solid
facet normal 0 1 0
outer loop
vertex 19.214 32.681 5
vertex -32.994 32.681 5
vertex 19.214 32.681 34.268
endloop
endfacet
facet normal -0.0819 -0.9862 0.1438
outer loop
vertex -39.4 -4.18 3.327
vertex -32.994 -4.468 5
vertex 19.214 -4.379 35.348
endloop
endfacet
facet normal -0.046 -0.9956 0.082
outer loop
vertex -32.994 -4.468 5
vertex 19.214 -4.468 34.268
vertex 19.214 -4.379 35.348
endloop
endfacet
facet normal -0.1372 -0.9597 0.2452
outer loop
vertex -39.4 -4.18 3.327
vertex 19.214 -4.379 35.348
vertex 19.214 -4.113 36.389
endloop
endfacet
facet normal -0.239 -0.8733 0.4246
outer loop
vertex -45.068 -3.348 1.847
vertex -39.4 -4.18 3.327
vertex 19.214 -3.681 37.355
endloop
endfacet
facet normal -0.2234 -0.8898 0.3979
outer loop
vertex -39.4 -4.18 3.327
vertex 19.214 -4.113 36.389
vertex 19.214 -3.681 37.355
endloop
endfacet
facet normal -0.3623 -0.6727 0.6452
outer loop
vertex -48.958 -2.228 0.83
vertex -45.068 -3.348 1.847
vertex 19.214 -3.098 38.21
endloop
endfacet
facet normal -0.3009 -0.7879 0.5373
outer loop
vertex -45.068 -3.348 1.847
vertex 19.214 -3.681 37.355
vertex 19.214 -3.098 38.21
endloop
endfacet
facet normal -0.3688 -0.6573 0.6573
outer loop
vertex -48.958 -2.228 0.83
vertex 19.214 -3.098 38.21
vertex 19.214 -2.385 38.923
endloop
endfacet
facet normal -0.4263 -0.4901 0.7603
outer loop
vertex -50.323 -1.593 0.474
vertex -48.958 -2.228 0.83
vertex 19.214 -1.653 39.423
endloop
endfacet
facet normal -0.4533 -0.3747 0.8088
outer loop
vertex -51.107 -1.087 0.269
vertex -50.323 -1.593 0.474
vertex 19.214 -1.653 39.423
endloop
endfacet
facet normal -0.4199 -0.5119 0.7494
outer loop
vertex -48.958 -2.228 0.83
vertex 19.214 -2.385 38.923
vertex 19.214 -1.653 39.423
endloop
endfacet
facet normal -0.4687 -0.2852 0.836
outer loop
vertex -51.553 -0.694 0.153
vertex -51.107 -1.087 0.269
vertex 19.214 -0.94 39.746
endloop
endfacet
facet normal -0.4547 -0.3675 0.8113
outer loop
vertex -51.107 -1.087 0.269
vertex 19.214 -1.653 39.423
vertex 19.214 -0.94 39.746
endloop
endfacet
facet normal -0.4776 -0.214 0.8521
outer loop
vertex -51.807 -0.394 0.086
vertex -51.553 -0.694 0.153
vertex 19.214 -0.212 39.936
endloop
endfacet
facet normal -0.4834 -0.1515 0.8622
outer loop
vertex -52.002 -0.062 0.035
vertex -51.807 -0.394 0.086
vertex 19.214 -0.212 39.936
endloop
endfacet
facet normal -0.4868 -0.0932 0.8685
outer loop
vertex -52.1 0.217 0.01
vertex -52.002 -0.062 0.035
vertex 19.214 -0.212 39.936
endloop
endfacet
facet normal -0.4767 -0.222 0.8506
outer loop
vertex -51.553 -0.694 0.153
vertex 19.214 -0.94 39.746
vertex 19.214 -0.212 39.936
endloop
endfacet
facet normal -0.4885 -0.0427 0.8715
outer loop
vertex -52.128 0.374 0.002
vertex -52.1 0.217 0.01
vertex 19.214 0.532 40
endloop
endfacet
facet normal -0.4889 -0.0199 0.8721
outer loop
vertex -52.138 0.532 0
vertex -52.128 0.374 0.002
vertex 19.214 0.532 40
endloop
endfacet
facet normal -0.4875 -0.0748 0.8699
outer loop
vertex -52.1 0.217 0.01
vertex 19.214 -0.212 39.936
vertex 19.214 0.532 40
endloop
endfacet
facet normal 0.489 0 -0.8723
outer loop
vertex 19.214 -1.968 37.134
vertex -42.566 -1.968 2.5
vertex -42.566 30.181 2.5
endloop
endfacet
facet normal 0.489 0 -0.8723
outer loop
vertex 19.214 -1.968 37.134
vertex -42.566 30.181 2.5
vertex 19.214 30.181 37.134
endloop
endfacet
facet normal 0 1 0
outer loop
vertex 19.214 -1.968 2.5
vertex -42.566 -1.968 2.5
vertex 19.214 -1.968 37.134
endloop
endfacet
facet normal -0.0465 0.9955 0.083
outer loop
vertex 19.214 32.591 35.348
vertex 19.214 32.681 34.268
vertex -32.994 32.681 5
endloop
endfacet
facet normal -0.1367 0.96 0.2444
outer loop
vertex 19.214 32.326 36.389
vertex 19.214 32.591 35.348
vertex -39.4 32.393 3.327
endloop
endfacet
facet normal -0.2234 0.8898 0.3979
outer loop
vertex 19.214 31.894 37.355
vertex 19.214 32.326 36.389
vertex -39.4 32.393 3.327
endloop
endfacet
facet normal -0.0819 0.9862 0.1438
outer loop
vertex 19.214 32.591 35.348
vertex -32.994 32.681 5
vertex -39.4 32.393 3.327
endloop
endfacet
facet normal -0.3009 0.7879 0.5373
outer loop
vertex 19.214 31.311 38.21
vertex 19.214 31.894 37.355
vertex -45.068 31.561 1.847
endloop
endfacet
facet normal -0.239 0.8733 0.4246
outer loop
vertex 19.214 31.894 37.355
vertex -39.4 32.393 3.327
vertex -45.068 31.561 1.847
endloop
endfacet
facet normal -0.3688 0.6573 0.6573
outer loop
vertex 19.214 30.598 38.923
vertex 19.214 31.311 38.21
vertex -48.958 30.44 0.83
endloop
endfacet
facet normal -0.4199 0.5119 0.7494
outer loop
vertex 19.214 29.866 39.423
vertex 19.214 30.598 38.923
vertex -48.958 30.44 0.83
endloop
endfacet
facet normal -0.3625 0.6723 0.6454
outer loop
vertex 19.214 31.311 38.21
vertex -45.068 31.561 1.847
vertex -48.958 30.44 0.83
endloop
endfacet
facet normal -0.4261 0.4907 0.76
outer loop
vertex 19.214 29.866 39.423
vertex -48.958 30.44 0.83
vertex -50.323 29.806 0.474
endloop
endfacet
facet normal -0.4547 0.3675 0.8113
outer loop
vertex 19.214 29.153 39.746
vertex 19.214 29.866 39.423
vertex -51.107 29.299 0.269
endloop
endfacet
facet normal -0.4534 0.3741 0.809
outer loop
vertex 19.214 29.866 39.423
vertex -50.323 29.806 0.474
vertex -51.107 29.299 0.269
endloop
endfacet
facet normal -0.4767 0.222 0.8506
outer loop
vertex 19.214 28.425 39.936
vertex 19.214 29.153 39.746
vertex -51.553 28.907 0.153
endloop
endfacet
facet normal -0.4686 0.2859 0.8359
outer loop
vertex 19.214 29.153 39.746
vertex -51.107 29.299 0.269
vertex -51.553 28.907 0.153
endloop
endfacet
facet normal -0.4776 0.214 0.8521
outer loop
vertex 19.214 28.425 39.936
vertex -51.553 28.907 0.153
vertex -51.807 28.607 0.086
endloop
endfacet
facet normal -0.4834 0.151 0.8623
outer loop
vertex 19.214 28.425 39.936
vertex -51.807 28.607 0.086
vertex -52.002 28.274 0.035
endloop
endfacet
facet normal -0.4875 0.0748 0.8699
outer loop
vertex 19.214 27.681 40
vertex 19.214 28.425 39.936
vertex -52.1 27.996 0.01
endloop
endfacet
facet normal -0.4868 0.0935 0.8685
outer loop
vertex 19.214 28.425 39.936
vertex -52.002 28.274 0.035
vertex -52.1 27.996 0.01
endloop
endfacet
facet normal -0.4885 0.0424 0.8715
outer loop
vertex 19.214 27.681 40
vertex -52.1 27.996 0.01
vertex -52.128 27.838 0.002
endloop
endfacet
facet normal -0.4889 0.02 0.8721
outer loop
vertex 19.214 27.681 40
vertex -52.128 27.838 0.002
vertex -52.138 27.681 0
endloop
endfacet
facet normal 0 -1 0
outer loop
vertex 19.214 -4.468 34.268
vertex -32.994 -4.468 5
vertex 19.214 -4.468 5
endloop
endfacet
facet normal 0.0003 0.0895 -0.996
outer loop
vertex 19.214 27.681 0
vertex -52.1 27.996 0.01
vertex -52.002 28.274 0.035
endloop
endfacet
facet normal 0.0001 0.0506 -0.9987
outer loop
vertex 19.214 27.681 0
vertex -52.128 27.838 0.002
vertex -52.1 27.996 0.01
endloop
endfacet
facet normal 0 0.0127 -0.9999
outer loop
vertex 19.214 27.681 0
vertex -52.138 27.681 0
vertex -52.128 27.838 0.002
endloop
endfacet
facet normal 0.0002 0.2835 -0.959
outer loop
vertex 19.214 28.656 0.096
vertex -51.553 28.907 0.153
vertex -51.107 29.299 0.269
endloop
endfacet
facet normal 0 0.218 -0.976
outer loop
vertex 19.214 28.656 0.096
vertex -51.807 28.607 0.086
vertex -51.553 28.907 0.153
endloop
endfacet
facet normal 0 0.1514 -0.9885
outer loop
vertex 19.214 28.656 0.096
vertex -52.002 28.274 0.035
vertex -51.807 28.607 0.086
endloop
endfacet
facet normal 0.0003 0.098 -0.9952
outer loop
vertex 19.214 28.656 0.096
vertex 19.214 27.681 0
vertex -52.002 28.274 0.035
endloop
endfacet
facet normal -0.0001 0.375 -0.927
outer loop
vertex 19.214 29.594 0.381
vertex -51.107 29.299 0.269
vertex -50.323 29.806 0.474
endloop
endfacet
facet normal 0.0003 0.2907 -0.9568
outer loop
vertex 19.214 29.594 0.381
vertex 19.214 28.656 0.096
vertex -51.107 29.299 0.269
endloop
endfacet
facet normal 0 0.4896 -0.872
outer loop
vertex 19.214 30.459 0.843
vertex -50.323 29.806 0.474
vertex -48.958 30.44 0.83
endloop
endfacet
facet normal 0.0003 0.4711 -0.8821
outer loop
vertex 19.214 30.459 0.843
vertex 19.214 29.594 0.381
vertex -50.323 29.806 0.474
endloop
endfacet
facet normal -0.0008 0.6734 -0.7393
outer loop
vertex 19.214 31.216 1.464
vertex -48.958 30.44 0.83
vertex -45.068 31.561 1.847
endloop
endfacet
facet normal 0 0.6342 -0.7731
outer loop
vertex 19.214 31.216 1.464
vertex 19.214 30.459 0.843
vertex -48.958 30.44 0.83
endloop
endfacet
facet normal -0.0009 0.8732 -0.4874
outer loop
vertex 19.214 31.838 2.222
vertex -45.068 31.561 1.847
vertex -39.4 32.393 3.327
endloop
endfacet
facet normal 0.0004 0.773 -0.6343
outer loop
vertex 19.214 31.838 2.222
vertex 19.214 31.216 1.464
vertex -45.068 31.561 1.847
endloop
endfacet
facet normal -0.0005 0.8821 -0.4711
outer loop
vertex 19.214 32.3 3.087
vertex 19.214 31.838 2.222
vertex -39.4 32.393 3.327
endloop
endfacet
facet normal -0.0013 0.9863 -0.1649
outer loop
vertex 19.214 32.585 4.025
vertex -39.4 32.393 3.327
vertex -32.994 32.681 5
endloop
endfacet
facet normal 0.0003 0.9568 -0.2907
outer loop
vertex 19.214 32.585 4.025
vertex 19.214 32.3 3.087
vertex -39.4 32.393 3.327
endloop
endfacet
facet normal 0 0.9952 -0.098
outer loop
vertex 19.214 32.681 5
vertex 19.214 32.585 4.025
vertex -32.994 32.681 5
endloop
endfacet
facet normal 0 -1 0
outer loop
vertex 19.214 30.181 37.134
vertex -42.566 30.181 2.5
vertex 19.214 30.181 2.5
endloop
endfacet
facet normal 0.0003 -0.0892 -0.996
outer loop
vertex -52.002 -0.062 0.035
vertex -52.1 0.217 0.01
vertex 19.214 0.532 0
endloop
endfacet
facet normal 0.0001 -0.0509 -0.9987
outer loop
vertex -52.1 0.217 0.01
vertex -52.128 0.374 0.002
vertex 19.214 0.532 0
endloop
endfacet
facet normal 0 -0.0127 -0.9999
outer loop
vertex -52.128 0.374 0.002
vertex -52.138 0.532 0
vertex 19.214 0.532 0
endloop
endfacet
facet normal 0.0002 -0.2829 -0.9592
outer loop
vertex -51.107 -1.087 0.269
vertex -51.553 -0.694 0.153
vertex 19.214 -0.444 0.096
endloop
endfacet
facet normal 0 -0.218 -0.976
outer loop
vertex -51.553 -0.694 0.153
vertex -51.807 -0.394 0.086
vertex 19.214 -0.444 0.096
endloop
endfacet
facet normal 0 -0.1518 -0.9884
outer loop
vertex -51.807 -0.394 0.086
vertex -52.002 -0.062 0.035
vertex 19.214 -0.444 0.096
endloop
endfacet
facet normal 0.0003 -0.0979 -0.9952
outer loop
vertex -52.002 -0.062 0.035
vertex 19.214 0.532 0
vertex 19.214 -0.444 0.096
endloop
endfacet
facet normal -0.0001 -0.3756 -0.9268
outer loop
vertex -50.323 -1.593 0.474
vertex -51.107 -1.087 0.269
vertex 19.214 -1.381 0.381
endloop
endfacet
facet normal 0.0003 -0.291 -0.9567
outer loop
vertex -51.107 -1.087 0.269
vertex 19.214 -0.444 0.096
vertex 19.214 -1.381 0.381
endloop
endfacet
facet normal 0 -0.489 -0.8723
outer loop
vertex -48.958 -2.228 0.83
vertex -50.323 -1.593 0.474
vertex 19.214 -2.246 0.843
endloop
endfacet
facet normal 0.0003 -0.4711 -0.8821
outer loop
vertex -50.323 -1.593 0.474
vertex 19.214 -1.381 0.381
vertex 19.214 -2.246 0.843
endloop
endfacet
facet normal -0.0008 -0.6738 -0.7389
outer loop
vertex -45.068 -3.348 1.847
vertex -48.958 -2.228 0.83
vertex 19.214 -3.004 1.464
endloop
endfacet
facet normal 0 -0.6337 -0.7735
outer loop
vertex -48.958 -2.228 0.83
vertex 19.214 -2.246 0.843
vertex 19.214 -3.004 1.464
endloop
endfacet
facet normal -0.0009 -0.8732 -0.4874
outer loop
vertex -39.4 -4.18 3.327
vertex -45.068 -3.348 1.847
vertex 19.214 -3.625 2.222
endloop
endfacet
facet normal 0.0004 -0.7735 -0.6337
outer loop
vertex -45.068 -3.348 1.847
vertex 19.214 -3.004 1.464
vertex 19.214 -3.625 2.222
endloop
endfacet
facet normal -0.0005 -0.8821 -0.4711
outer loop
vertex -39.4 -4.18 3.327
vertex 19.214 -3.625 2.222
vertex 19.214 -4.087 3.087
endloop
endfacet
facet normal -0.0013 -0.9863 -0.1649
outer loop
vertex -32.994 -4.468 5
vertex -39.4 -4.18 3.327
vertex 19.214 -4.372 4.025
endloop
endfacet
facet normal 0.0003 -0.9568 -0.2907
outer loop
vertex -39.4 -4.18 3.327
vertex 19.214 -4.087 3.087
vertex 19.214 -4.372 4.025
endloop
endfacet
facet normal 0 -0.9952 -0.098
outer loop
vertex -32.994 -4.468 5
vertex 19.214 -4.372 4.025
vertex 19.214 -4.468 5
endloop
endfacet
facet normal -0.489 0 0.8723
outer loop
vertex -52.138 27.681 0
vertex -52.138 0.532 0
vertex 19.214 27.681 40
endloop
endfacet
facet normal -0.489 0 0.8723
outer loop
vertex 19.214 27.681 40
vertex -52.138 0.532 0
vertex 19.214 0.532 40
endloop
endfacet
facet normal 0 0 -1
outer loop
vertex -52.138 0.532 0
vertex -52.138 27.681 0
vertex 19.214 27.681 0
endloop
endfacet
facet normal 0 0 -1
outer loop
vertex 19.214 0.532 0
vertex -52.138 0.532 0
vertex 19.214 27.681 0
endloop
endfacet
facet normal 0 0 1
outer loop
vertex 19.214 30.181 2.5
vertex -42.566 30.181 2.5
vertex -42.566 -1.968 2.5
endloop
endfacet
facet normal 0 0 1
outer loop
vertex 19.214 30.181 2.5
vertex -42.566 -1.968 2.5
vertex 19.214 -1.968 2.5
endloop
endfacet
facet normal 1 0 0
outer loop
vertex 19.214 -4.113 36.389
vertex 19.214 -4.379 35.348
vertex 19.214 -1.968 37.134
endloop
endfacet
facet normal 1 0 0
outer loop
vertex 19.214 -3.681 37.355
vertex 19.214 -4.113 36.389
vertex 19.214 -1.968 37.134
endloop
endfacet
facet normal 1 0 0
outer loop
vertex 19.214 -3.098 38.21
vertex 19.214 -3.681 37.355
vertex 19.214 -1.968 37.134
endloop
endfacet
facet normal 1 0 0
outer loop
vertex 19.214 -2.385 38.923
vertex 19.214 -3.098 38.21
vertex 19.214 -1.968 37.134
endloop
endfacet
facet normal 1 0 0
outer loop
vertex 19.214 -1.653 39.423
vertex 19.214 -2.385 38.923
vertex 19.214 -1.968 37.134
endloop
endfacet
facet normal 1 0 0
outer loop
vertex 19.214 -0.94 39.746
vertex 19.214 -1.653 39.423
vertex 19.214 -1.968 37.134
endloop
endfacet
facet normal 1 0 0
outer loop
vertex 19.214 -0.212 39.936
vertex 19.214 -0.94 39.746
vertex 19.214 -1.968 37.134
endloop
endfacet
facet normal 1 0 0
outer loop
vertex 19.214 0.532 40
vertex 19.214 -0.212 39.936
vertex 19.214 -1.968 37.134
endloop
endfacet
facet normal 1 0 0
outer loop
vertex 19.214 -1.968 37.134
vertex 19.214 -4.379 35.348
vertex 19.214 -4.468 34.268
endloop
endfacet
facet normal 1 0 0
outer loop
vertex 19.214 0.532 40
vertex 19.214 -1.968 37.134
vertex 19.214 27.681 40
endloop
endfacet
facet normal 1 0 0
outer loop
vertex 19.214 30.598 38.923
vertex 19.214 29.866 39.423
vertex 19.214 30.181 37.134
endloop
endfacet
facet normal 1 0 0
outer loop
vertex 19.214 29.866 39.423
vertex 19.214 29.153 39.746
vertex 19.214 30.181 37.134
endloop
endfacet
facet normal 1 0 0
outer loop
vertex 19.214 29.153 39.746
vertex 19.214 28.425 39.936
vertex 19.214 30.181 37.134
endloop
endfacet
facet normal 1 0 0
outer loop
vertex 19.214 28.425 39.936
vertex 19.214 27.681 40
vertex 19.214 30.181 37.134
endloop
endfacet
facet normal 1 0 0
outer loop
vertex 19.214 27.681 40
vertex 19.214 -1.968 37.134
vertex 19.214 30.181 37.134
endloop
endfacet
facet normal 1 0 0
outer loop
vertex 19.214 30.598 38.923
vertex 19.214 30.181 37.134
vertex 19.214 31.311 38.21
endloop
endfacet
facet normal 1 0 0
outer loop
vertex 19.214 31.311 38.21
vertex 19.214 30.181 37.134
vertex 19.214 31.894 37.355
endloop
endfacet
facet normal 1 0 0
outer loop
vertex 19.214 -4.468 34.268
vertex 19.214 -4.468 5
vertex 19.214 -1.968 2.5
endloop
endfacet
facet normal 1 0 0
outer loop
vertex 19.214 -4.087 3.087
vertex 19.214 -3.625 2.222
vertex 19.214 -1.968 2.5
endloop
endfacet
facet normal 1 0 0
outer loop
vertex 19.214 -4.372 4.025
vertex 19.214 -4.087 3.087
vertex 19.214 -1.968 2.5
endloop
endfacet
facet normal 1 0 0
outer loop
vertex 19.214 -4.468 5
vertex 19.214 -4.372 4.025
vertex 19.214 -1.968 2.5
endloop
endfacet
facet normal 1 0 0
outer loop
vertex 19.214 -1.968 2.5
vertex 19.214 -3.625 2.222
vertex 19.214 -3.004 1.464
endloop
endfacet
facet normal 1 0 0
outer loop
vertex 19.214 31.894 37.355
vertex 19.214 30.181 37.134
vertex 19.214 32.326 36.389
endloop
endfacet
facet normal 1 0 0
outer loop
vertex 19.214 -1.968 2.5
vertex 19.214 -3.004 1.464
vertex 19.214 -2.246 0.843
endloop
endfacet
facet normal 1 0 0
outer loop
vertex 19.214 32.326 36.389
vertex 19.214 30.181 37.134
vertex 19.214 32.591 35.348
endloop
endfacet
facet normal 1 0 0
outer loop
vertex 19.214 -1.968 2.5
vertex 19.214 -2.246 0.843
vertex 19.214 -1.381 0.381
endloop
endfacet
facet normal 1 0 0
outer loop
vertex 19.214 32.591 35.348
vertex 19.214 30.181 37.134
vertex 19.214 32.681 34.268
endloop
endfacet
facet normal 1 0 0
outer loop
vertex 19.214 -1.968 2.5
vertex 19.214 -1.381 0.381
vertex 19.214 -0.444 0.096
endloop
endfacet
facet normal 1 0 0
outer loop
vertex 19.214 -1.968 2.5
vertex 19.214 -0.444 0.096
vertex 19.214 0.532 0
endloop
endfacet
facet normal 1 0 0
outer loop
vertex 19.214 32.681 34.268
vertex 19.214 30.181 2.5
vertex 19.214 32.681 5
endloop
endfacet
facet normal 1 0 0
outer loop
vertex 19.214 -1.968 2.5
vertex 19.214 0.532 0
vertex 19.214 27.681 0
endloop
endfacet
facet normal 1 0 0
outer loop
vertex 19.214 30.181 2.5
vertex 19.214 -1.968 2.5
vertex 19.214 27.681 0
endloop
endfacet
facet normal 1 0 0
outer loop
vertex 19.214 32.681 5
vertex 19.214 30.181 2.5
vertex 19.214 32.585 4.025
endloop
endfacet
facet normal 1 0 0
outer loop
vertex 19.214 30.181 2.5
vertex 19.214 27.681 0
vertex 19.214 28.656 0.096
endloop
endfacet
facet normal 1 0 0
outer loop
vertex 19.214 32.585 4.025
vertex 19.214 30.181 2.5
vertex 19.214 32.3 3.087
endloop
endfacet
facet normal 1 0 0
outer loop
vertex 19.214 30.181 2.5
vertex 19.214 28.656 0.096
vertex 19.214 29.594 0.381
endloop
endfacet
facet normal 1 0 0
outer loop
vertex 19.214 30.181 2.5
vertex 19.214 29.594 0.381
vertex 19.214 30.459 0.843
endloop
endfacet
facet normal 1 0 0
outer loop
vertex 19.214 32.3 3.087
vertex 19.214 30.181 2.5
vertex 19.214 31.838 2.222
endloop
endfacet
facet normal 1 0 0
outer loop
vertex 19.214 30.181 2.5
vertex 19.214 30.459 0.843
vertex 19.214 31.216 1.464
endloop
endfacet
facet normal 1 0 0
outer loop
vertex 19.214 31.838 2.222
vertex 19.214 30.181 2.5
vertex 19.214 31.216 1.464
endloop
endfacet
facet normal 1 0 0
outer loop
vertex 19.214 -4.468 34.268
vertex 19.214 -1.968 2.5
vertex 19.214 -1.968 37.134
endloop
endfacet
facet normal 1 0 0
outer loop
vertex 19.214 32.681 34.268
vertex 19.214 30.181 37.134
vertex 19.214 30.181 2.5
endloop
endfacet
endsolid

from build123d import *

# Parameters (mm, degrees)
F0_W     = 71.3519603014
F0_H     = 37.1488952078
F1_DEPTH = 40
F3_DEPTH = 25
F4_DEPTH = 12.1498952078
F5_T     = -2.5
F6_R     = 5


with BuildPart() as f1:
    # F0 (on Top) → F1 (new body)
    with BuildSketch(Plane.XY):
        with Locations((-16.4616554976, 14.1063730698)):
            Rectangle(F0_W, F0_H)
    extrude(amount=F1_DEPTH)

    # F2 (on face) → F3 (cut)
    with BuildSketch(Plane.XZ.offset(4.4680745341)):
        Polygon((-52.1376356483, 40), (-52.1376356483, 0), (19.2143246531, 40), align=None)
    extrude(amount=-F3_DEPTH, mode=Mode.SUBTRACT)

    # F4 (cut, through all): a face of the model
    f4_faces = [f1.faces().sort_by_distance(p)[0] for p in [
        (-28.3536488811, 20.5319254659, 26.6666666667),
    ]]
    extrude(f4_faces, amount=-F4_DEPTH, mode=Mode.SUBTRACT)

    # F5
    f5_openings = [f1.faces().sort_by_distance(p)[0] for p in [
        (19.214325, 14.106373, 20),
    ]]
    offset(amount=F5_T, openings=f5_openings)

    # F6
    f6_edges = [f1.edges().sort_by_distance(p)[0] for p in [
        (-16.461655, 32.680821, 20),
        (-16.461655, 32.680821, 0),
        (-16.461655, -4.468075, 20),
        (-16.461655, -4.468075, 0),
    ]]
    fillet(f6_edges, radius=F6_R)


solid = f1.part
